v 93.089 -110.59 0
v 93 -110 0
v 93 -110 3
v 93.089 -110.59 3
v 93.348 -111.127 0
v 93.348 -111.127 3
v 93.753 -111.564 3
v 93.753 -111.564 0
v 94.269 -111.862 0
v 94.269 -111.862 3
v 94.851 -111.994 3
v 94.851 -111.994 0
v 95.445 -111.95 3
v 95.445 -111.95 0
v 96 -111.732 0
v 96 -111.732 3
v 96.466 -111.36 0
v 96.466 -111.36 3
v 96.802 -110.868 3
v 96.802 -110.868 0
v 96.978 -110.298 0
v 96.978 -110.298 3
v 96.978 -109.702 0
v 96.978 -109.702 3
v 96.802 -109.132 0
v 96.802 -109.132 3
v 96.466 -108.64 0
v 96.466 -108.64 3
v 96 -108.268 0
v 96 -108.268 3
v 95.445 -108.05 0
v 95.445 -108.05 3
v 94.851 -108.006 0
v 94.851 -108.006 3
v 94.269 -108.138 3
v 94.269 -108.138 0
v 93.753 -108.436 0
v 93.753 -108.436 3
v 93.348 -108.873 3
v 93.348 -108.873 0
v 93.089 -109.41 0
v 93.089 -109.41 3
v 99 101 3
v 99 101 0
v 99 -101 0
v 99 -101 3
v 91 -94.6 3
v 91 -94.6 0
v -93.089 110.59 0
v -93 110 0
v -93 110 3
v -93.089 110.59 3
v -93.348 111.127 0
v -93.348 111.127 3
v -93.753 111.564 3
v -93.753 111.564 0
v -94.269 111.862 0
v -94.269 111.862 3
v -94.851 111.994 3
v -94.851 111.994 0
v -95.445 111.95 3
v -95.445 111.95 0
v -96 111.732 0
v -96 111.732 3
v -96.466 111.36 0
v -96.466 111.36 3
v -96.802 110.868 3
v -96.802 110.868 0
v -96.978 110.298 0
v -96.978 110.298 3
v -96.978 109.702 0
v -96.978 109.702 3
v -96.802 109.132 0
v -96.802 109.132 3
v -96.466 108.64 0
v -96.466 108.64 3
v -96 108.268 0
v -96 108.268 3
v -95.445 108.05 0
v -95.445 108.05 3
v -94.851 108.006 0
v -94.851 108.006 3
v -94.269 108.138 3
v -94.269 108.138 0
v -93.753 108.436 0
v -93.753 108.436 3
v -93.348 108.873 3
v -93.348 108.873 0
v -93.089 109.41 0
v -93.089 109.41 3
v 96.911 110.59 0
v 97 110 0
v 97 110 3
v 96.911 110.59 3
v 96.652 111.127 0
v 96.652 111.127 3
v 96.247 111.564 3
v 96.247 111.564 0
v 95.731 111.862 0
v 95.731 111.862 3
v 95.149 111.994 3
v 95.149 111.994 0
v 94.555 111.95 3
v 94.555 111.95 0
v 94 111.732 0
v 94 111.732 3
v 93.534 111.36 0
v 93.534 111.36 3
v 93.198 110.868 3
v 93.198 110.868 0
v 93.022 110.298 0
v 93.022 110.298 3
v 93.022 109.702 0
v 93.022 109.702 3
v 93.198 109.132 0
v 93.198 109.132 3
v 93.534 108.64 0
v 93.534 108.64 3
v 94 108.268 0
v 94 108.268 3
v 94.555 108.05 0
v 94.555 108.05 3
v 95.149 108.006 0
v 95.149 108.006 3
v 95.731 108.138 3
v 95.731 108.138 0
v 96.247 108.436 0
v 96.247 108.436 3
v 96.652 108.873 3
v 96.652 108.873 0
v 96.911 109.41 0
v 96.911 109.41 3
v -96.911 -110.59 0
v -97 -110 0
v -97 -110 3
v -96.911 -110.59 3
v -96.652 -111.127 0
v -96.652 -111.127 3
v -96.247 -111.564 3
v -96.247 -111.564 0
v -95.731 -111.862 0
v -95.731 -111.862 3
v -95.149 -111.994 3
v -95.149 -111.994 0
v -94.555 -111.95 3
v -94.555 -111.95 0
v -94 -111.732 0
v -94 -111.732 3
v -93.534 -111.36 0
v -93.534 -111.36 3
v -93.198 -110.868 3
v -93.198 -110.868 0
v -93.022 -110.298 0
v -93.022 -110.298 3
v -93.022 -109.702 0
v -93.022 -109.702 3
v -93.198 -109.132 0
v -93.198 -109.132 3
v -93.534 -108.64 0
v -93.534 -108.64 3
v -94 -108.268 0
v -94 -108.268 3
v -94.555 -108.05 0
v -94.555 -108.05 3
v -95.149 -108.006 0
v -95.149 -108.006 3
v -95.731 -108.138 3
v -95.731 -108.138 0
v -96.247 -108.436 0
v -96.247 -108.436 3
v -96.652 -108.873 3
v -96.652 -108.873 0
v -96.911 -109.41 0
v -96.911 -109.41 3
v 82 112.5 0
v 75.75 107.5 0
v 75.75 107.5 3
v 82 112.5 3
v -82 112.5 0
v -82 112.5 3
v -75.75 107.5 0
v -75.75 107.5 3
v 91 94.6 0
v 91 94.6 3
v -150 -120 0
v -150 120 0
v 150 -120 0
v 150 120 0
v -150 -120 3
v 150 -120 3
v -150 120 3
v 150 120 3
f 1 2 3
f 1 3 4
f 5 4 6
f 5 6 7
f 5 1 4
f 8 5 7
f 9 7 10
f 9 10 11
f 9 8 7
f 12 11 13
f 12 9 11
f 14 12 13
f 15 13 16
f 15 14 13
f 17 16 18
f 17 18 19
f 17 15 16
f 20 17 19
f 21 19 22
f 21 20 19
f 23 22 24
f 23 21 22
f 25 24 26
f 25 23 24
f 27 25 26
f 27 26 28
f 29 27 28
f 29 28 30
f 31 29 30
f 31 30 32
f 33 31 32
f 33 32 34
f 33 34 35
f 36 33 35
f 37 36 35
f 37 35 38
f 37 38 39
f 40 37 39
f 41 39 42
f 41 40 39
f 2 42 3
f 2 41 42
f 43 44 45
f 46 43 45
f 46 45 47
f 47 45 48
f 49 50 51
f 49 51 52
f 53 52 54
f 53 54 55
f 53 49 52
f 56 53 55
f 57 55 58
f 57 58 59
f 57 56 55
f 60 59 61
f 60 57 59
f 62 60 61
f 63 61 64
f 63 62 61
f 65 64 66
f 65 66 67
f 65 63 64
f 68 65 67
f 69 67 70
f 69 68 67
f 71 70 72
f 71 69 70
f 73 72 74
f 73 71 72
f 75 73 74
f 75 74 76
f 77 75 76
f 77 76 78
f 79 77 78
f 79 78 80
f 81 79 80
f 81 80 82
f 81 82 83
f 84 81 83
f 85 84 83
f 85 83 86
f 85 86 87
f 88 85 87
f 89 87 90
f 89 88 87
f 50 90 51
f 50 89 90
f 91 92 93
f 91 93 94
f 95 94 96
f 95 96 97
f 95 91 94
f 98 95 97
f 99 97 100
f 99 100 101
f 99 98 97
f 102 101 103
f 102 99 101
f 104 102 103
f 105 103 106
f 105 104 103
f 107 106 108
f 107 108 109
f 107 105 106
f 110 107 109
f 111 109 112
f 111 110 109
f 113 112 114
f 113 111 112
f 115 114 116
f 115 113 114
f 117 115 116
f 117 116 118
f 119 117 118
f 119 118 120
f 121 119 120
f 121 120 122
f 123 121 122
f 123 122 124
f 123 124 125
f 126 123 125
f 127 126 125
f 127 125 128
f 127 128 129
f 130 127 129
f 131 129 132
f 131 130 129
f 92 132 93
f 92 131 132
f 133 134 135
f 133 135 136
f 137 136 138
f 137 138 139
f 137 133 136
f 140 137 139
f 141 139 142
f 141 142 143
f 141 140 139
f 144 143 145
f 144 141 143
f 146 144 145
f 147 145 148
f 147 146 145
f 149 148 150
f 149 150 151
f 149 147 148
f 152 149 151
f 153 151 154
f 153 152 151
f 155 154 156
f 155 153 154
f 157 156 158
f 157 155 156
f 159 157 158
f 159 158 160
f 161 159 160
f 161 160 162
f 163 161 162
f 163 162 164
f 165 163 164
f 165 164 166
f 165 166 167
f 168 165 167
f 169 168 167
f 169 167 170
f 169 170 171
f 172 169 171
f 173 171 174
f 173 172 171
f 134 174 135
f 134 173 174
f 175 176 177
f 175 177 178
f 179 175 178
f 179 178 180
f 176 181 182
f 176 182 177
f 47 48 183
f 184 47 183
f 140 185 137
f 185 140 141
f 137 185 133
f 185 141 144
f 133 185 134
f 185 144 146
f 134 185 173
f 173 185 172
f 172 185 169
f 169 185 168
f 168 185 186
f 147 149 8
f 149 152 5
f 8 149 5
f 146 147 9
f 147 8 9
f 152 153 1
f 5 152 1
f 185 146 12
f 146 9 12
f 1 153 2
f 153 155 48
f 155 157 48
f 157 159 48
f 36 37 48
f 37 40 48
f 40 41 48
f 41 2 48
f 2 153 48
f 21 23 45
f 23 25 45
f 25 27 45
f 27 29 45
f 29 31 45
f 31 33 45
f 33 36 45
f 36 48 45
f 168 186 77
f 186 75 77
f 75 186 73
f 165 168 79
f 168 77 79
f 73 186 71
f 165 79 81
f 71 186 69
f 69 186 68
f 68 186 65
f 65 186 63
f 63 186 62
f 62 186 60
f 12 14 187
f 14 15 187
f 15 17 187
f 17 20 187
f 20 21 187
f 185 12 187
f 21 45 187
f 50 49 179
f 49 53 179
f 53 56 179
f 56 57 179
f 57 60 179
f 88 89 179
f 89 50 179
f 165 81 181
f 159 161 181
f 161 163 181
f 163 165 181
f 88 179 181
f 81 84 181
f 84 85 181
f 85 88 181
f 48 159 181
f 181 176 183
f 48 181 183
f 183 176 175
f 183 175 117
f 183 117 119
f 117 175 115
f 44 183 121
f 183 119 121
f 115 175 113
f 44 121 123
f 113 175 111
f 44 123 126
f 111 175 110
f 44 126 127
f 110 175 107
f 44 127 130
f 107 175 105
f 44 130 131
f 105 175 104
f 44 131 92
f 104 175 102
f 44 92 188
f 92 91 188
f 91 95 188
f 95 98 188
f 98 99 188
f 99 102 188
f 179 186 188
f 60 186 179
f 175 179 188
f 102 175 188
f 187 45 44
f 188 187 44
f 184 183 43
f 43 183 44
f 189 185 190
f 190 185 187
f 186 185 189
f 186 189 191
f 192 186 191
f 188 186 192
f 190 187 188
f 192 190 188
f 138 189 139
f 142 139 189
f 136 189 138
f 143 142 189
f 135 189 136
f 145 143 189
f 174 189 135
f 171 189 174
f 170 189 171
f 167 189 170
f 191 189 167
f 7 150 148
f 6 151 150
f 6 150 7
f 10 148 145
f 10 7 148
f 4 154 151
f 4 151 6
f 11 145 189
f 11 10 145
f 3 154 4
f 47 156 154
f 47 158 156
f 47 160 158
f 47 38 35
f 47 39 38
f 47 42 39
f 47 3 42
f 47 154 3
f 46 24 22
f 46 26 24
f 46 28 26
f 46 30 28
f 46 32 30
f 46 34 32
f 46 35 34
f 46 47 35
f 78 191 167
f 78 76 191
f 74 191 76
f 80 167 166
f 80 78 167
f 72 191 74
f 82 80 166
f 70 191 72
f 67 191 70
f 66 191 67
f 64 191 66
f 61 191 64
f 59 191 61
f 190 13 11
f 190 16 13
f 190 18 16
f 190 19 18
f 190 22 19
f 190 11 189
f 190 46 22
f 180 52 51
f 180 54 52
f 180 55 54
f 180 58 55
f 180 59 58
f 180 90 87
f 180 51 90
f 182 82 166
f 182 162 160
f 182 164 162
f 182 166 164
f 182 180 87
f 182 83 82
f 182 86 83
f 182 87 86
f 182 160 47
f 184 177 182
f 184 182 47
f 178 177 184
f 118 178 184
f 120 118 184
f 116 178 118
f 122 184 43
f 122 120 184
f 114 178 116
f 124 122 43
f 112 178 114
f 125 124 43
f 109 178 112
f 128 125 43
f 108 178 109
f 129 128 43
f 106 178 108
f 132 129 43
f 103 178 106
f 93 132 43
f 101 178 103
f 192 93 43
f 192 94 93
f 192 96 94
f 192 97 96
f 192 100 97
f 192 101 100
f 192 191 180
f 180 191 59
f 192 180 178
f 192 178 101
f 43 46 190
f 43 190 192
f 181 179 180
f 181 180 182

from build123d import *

# Parameters (mm, degrees)
SKETCH1_W           = 300
SKETCH1_H           = 240
SKETCH1_R           = 2
BOSS_EXTRUDE1_DEPTH = 3


with BuildPart() as part:
    # Sketch1 → Boss-Extrude1 (new body)
    with BuildSketch(Plane.XY):
        Rectangle(SKETCH1_W, SKETCH1_H)
        with Locations((-95, 110)):
            Circle(SKETCH1_R, mode=Mode.SUBTRACT)
        with Locations((95, 110)):
            Circle(SKETCH1_R, mode=Mode.SUBTRACT)
        with Locations(Location((95, -110, 0), (0, 0, 180))):
            Circle(SKETCH1_R, mode=Mode.SUBTRACT)
        with Locations(Location((-95, -110, 0), (0, 0, 180))):
            Circle(SKETCH1_R, mode=Mode.SUBTRACT)
        Polygon((99, 101), (99, -101), (91, -94.6), (91, 94.6), align=None, mode=Mode.SUBTRACT)
        Polygon((82, 112.5), (-82, 112.5), (-75.75, 107.5), (75.75, 107.5), align=None, mode=Mode.SUBTRACT)
    extrude(amount=BOSS_EXTRUDE1_DEPTH)


solid = part.part
